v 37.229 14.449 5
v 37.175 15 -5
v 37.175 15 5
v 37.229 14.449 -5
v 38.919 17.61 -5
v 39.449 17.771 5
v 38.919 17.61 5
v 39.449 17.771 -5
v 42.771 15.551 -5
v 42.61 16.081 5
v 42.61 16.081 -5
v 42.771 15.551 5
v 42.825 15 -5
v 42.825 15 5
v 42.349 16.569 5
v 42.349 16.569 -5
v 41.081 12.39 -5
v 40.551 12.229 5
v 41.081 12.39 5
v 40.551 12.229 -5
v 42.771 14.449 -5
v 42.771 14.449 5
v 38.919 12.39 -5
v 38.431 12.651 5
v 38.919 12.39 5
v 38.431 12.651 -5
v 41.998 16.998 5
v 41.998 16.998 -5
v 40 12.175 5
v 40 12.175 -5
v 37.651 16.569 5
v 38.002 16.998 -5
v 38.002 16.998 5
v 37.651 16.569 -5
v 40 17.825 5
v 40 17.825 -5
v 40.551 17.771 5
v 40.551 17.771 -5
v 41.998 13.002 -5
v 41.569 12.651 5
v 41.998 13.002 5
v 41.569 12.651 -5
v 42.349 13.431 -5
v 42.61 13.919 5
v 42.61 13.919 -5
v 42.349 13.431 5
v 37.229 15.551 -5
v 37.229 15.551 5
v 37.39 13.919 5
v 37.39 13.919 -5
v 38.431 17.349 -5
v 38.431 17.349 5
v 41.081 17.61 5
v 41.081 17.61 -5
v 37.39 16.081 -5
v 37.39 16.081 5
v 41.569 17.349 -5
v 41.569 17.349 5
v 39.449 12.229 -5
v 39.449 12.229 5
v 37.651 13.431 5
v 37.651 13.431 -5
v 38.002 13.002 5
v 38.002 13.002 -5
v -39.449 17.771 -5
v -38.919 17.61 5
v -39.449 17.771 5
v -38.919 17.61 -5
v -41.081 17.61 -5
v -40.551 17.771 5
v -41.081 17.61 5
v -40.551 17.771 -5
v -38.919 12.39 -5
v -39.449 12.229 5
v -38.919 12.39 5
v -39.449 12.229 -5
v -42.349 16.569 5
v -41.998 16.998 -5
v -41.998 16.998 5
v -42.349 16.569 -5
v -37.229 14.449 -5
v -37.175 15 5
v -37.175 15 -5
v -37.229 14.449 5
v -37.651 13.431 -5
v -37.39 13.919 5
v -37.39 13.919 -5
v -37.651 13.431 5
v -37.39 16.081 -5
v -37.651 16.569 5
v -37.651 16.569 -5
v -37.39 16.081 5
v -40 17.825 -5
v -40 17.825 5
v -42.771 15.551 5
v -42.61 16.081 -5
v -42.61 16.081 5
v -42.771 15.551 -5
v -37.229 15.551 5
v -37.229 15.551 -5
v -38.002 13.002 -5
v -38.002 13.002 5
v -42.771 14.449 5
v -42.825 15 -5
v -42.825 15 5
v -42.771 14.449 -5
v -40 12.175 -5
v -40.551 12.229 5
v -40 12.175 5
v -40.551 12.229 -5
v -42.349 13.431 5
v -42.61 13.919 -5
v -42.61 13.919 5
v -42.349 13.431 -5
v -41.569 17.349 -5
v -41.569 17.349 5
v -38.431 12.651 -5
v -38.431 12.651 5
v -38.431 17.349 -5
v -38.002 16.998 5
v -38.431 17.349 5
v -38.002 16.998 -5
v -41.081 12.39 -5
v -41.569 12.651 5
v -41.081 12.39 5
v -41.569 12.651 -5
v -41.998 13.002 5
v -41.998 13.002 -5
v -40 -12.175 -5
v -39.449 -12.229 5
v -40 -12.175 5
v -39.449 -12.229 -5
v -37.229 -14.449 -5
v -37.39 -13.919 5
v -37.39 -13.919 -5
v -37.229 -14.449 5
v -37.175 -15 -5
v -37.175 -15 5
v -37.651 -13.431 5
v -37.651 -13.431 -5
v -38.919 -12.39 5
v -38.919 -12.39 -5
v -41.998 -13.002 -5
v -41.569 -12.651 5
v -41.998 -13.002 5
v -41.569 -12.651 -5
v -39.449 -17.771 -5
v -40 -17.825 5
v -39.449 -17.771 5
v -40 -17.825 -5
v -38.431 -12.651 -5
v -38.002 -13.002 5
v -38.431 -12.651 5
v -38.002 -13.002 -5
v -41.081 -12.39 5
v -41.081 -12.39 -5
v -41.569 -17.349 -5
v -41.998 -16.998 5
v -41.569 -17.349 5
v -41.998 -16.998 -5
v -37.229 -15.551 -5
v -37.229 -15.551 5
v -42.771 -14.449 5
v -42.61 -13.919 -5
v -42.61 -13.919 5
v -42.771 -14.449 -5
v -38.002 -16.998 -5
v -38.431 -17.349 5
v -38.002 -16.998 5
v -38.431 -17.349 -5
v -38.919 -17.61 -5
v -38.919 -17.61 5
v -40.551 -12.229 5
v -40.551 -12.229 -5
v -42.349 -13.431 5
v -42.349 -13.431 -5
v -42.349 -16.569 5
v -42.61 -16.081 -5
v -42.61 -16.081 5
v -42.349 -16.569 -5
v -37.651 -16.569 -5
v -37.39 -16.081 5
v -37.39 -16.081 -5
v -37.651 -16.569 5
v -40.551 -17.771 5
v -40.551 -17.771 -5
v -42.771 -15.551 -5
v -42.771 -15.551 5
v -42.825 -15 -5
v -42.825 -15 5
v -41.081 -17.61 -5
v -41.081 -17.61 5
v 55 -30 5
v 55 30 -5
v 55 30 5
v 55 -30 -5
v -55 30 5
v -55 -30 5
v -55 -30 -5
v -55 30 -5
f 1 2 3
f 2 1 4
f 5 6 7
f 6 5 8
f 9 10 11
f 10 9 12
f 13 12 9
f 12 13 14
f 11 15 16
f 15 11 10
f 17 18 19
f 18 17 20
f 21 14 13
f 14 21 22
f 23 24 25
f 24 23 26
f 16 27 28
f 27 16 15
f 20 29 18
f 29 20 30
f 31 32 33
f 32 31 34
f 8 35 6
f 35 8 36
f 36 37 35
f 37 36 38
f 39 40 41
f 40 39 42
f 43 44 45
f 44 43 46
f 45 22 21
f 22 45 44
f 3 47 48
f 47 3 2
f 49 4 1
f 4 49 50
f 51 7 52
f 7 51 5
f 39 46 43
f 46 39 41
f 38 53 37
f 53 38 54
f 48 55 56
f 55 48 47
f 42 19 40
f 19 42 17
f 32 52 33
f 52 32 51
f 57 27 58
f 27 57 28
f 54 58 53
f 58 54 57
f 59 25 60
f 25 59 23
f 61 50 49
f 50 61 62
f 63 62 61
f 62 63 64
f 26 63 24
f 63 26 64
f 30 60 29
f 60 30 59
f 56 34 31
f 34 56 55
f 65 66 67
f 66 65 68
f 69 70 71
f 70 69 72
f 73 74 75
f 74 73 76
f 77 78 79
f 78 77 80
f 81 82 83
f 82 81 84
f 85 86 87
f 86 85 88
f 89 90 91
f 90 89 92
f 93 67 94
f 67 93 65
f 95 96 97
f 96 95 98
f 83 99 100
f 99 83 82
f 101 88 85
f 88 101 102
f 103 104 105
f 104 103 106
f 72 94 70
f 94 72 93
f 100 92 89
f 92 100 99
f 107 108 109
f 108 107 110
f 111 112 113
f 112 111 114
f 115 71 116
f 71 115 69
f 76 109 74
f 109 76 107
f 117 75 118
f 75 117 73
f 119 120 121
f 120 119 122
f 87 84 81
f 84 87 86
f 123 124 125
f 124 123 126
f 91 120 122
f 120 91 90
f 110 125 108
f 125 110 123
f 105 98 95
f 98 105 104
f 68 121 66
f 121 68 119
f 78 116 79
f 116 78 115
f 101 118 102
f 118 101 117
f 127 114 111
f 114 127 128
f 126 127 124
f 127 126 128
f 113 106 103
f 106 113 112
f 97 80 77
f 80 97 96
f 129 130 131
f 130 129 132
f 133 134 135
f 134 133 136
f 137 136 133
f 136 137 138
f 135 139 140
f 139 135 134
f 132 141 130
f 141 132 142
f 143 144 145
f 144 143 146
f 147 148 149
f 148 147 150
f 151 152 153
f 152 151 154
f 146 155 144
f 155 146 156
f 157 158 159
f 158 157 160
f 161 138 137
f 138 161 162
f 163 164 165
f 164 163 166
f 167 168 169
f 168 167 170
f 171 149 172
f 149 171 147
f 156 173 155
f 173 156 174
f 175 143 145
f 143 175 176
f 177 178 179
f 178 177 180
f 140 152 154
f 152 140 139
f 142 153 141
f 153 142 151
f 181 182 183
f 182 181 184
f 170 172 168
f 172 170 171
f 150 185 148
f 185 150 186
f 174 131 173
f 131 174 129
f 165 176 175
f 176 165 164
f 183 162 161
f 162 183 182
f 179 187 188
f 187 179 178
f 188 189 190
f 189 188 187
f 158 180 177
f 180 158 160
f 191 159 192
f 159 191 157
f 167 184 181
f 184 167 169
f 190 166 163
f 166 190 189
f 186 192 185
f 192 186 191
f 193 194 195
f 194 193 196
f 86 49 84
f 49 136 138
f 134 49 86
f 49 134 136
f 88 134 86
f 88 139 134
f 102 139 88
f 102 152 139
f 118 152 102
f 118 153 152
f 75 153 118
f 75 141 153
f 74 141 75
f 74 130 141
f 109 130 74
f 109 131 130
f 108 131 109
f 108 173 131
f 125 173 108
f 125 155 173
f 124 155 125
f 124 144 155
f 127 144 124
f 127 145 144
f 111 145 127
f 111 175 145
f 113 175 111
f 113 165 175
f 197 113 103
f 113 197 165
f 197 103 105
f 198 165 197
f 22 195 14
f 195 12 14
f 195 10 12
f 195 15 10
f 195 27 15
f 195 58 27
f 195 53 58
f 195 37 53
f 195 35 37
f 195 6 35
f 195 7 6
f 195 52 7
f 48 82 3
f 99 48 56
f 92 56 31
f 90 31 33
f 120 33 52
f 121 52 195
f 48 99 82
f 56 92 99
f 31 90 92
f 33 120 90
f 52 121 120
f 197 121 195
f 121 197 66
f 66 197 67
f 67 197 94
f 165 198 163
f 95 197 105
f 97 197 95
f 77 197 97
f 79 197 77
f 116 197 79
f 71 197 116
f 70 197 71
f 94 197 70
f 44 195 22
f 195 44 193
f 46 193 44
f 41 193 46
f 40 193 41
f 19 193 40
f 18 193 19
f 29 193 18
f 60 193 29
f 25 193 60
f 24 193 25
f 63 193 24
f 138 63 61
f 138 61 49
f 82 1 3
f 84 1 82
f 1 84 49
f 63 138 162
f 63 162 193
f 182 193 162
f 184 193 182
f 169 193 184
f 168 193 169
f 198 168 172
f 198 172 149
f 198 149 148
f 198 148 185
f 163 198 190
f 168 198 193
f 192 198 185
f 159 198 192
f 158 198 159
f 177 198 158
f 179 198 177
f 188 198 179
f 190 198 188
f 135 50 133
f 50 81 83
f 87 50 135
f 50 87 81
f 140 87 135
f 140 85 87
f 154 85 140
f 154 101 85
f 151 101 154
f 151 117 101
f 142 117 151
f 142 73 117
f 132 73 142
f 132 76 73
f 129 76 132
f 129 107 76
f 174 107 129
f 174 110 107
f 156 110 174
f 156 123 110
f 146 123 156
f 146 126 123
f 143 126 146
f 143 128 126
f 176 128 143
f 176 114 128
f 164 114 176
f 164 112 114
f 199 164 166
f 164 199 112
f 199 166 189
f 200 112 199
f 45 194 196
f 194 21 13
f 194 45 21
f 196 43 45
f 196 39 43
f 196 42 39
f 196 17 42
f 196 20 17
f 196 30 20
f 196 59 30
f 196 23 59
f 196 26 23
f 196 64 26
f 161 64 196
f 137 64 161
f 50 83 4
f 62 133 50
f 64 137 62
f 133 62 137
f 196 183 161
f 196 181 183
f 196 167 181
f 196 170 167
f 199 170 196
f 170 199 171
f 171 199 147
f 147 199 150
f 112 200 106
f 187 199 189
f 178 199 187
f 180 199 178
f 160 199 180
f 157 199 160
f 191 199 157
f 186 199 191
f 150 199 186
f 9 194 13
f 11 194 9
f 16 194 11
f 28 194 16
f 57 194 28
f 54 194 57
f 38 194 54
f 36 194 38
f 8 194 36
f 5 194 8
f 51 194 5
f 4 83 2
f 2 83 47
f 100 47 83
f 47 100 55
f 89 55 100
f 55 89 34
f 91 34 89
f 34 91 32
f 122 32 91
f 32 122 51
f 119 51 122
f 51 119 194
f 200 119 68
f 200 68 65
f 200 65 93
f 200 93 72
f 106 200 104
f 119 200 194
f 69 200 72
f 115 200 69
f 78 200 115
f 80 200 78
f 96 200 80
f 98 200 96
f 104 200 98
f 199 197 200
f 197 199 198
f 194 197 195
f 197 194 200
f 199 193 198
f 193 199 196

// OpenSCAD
$fn = 32;

// ----------------------------------------------------------------------
// Corner plate 110 x 60 x 10
// 3 holes, centres taken from the edge offset
// ----------------------------------------------------------------------

// --- parameters (mm) ---
plate = [110, 60, 10];   // overall size (x, y, z)
holes = 3;               // number of holes the drawing asks for
bore_d = 5.5;            // nominal hole diameter from the drawing
print_allowance = 0.15;  // clearance added for printing
edge = 15;               // hole centre offset from the plate edge

// --- derived feature positions (mm) ---
hole_d = bore_d + print_allowance;  // = 5.65   hole diameter as printed
corner_x = plate[0] / 2 - edge;     // = 40   corner hole X
corner_y = plate[1] / 2 - edge;     // = 15   corner hole Y
feature_centers = [
  [corner_x, corner_y],
  [-corner_x, corner_y],
  [-corner_x, -corner_y]
];   // hole centres the loop below drills

// plate outline, every hole drilled through with the same cutters
difference() {
  cube(plate, center = true);
  for (centre = feature_centers)
    translate([centre[0], centre[1], 0])
      cylinder(d = hole_d, h = plate[2] + 2, center = true);
}
